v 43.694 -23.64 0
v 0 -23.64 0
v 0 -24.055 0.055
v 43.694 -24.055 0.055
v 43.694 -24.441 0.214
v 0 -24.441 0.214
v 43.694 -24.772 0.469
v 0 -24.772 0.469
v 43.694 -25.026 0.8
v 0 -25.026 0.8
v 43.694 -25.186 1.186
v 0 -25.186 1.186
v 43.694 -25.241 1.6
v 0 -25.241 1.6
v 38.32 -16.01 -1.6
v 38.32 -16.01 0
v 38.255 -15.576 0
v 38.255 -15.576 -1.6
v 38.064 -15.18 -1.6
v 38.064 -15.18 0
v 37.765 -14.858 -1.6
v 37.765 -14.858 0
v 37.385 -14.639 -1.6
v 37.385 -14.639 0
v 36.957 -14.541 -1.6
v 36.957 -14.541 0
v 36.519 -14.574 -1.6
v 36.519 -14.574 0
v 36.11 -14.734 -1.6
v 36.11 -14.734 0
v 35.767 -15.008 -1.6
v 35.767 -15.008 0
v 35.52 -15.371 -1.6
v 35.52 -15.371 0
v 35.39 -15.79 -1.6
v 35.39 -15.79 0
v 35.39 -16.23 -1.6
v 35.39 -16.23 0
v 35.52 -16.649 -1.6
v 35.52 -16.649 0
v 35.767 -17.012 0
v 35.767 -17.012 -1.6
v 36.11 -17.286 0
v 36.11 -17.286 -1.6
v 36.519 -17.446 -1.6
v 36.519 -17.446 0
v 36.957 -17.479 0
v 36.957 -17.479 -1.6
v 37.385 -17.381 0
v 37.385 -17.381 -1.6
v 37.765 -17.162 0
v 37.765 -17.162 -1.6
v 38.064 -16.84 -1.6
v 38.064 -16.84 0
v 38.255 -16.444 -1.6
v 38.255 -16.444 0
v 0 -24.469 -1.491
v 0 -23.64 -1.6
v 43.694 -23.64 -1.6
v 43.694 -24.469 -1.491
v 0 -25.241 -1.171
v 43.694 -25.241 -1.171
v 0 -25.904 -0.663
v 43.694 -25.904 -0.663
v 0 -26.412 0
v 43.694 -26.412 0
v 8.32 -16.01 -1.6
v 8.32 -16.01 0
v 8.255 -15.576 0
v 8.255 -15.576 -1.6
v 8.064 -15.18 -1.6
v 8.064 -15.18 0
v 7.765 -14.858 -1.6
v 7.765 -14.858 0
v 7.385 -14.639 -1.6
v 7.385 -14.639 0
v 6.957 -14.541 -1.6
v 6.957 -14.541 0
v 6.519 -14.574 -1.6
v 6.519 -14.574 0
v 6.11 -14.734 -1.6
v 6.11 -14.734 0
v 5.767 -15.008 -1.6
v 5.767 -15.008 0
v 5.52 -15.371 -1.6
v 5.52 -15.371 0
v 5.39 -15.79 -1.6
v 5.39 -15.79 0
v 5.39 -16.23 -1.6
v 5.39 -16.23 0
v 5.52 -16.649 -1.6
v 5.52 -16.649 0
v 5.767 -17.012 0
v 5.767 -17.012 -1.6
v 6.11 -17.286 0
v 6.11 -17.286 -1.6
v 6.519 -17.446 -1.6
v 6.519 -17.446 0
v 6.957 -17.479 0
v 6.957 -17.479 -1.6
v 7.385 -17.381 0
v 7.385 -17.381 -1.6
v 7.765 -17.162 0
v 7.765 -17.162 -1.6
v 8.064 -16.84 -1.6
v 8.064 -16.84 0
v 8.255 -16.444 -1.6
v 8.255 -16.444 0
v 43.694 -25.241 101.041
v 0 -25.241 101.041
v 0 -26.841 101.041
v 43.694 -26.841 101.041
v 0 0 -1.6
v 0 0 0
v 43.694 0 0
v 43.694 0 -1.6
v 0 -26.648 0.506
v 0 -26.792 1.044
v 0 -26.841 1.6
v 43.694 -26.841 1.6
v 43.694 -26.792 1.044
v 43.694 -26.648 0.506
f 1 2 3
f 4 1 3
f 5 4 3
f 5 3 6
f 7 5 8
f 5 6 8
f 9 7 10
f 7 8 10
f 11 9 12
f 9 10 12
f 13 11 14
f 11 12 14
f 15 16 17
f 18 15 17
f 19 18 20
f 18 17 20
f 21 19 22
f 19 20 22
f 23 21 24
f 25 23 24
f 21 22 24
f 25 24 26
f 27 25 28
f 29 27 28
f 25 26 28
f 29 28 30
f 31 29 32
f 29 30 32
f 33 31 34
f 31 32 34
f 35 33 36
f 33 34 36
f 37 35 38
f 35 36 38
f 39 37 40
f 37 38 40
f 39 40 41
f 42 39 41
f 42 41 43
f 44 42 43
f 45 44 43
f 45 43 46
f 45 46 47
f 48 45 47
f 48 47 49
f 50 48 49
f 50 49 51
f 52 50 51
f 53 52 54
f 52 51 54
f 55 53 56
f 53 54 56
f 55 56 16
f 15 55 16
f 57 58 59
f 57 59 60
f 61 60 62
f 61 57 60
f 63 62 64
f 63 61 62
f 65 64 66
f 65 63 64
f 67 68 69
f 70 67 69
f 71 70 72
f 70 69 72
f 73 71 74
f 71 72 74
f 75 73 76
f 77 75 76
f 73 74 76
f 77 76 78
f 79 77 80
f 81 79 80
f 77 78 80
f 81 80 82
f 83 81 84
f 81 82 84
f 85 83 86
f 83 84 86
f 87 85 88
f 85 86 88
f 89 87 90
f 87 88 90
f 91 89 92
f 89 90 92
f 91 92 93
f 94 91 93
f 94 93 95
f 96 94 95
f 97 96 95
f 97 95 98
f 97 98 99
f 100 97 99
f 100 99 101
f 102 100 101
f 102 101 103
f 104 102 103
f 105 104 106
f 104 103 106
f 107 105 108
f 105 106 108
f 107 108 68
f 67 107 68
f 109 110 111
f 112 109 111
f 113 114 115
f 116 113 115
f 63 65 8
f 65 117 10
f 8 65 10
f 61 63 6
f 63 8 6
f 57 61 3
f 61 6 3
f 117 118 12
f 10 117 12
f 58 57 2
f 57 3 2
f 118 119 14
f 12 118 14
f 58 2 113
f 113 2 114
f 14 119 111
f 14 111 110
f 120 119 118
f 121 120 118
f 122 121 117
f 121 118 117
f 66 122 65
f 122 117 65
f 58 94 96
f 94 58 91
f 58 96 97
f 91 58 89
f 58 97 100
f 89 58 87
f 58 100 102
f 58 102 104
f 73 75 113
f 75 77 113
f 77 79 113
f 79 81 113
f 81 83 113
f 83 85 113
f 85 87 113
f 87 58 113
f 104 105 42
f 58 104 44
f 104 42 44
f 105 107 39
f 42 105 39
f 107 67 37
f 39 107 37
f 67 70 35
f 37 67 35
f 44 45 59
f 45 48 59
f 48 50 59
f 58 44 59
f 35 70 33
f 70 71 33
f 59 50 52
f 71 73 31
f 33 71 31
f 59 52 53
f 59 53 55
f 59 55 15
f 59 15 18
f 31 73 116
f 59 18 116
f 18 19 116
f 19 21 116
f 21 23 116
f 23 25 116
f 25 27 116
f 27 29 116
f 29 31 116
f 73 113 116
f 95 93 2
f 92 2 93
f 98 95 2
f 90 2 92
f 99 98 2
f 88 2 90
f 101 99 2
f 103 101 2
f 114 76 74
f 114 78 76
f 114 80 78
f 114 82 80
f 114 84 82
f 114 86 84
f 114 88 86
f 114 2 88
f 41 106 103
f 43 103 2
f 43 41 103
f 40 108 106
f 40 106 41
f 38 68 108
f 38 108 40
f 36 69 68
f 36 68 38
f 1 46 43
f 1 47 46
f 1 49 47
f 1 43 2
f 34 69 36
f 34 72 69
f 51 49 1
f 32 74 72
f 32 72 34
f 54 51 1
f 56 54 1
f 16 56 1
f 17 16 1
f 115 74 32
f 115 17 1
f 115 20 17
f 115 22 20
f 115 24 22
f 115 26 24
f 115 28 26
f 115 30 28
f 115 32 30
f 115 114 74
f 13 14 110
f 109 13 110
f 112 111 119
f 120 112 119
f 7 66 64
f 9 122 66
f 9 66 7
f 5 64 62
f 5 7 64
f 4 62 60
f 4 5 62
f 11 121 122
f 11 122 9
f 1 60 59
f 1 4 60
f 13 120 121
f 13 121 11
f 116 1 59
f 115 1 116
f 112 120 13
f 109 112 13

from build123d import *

# Parameters (mm, degrees)
SKETCH1_W              = 43.69375
SKETCH1_H              = 126.6
SKETCH1_R              = 1.4732
BASE_FLANGE1_DEPTH     = 1.6002
SKETCHED_BEND1_DEPTH   = 43.69375
SKETCHED_BEND1_2_DEPTH = 43.69375


# Read off the part's stored shape, not the designer's step: Sketched Bend1
# Sheet-metal steps are written as plain solids
with BuildPart() as part:
    # Sketch1 → Base-Flange1 (new body)
    with BuildSketch(Plane.XY):
        with Locations((21.846875, -63.3)):
            Rectangle(SKETCH1_W, SKETCH1_H)
        with Locations((6.846875, -16.01)):
            Circle(SKETCH1_R, mode=Mode.SUBTRACT)
        with Locations((36.846875, -16.01)):
            Circle(SKETCH1_R, mode=Mode.SUBTRACT)
    extrude(amount=-BASE_FLANGE1_DEPTH)

    # Sketched Bend1 outline → Sketched Bend1 (cut)
    with BuildSketch(Plane.YZ):
        with BuildLine():
            ThreePointArc((-23.640488203, -1.6002), (-25.240688203, -1.171427702), (-26.412115905, 0))
            Line((-26.412115905, 0), (-126.6, 0))
            Line((-126.6, 0), (-126.6, -1.6002))
            Line((-126.6, -1.6002), (-23.640488203, -1.6002))
        make_face()
    extrude(amount=SKETCHED_BEND1_DEPTH, mode=Mode.SUBTRACT)

    # Sketched Bend1 2 outline → Sketched Bend1 2 (add)
    with BuildSketch(Plane.YZ):
        with BuildLine():
            ThreePointArc((-23.640488203, 0), (-24.772000474, 0.468687729), (-25.240688203, 1.6002))
            Line((-25.240688203, 1.6002), (-25.240688203, 101.040688203))
            Line((-25.240688203, 101.040688203), (-26.840888203, 101.040688203))
            Line((-26.840888203, 101.040688203), (-26.840888203, 1.6002))
            ThreePointArc((-26.840888203, 1.6002), (-26.731837217, 0.771875528), (-26.412115905, 0))
            Line((-26.412115905, 0), (-23.640488203, 0))
        make_face()
    extrude(amount=SKETCHED_BEND1_2_DEPTH)


solid = part.part
